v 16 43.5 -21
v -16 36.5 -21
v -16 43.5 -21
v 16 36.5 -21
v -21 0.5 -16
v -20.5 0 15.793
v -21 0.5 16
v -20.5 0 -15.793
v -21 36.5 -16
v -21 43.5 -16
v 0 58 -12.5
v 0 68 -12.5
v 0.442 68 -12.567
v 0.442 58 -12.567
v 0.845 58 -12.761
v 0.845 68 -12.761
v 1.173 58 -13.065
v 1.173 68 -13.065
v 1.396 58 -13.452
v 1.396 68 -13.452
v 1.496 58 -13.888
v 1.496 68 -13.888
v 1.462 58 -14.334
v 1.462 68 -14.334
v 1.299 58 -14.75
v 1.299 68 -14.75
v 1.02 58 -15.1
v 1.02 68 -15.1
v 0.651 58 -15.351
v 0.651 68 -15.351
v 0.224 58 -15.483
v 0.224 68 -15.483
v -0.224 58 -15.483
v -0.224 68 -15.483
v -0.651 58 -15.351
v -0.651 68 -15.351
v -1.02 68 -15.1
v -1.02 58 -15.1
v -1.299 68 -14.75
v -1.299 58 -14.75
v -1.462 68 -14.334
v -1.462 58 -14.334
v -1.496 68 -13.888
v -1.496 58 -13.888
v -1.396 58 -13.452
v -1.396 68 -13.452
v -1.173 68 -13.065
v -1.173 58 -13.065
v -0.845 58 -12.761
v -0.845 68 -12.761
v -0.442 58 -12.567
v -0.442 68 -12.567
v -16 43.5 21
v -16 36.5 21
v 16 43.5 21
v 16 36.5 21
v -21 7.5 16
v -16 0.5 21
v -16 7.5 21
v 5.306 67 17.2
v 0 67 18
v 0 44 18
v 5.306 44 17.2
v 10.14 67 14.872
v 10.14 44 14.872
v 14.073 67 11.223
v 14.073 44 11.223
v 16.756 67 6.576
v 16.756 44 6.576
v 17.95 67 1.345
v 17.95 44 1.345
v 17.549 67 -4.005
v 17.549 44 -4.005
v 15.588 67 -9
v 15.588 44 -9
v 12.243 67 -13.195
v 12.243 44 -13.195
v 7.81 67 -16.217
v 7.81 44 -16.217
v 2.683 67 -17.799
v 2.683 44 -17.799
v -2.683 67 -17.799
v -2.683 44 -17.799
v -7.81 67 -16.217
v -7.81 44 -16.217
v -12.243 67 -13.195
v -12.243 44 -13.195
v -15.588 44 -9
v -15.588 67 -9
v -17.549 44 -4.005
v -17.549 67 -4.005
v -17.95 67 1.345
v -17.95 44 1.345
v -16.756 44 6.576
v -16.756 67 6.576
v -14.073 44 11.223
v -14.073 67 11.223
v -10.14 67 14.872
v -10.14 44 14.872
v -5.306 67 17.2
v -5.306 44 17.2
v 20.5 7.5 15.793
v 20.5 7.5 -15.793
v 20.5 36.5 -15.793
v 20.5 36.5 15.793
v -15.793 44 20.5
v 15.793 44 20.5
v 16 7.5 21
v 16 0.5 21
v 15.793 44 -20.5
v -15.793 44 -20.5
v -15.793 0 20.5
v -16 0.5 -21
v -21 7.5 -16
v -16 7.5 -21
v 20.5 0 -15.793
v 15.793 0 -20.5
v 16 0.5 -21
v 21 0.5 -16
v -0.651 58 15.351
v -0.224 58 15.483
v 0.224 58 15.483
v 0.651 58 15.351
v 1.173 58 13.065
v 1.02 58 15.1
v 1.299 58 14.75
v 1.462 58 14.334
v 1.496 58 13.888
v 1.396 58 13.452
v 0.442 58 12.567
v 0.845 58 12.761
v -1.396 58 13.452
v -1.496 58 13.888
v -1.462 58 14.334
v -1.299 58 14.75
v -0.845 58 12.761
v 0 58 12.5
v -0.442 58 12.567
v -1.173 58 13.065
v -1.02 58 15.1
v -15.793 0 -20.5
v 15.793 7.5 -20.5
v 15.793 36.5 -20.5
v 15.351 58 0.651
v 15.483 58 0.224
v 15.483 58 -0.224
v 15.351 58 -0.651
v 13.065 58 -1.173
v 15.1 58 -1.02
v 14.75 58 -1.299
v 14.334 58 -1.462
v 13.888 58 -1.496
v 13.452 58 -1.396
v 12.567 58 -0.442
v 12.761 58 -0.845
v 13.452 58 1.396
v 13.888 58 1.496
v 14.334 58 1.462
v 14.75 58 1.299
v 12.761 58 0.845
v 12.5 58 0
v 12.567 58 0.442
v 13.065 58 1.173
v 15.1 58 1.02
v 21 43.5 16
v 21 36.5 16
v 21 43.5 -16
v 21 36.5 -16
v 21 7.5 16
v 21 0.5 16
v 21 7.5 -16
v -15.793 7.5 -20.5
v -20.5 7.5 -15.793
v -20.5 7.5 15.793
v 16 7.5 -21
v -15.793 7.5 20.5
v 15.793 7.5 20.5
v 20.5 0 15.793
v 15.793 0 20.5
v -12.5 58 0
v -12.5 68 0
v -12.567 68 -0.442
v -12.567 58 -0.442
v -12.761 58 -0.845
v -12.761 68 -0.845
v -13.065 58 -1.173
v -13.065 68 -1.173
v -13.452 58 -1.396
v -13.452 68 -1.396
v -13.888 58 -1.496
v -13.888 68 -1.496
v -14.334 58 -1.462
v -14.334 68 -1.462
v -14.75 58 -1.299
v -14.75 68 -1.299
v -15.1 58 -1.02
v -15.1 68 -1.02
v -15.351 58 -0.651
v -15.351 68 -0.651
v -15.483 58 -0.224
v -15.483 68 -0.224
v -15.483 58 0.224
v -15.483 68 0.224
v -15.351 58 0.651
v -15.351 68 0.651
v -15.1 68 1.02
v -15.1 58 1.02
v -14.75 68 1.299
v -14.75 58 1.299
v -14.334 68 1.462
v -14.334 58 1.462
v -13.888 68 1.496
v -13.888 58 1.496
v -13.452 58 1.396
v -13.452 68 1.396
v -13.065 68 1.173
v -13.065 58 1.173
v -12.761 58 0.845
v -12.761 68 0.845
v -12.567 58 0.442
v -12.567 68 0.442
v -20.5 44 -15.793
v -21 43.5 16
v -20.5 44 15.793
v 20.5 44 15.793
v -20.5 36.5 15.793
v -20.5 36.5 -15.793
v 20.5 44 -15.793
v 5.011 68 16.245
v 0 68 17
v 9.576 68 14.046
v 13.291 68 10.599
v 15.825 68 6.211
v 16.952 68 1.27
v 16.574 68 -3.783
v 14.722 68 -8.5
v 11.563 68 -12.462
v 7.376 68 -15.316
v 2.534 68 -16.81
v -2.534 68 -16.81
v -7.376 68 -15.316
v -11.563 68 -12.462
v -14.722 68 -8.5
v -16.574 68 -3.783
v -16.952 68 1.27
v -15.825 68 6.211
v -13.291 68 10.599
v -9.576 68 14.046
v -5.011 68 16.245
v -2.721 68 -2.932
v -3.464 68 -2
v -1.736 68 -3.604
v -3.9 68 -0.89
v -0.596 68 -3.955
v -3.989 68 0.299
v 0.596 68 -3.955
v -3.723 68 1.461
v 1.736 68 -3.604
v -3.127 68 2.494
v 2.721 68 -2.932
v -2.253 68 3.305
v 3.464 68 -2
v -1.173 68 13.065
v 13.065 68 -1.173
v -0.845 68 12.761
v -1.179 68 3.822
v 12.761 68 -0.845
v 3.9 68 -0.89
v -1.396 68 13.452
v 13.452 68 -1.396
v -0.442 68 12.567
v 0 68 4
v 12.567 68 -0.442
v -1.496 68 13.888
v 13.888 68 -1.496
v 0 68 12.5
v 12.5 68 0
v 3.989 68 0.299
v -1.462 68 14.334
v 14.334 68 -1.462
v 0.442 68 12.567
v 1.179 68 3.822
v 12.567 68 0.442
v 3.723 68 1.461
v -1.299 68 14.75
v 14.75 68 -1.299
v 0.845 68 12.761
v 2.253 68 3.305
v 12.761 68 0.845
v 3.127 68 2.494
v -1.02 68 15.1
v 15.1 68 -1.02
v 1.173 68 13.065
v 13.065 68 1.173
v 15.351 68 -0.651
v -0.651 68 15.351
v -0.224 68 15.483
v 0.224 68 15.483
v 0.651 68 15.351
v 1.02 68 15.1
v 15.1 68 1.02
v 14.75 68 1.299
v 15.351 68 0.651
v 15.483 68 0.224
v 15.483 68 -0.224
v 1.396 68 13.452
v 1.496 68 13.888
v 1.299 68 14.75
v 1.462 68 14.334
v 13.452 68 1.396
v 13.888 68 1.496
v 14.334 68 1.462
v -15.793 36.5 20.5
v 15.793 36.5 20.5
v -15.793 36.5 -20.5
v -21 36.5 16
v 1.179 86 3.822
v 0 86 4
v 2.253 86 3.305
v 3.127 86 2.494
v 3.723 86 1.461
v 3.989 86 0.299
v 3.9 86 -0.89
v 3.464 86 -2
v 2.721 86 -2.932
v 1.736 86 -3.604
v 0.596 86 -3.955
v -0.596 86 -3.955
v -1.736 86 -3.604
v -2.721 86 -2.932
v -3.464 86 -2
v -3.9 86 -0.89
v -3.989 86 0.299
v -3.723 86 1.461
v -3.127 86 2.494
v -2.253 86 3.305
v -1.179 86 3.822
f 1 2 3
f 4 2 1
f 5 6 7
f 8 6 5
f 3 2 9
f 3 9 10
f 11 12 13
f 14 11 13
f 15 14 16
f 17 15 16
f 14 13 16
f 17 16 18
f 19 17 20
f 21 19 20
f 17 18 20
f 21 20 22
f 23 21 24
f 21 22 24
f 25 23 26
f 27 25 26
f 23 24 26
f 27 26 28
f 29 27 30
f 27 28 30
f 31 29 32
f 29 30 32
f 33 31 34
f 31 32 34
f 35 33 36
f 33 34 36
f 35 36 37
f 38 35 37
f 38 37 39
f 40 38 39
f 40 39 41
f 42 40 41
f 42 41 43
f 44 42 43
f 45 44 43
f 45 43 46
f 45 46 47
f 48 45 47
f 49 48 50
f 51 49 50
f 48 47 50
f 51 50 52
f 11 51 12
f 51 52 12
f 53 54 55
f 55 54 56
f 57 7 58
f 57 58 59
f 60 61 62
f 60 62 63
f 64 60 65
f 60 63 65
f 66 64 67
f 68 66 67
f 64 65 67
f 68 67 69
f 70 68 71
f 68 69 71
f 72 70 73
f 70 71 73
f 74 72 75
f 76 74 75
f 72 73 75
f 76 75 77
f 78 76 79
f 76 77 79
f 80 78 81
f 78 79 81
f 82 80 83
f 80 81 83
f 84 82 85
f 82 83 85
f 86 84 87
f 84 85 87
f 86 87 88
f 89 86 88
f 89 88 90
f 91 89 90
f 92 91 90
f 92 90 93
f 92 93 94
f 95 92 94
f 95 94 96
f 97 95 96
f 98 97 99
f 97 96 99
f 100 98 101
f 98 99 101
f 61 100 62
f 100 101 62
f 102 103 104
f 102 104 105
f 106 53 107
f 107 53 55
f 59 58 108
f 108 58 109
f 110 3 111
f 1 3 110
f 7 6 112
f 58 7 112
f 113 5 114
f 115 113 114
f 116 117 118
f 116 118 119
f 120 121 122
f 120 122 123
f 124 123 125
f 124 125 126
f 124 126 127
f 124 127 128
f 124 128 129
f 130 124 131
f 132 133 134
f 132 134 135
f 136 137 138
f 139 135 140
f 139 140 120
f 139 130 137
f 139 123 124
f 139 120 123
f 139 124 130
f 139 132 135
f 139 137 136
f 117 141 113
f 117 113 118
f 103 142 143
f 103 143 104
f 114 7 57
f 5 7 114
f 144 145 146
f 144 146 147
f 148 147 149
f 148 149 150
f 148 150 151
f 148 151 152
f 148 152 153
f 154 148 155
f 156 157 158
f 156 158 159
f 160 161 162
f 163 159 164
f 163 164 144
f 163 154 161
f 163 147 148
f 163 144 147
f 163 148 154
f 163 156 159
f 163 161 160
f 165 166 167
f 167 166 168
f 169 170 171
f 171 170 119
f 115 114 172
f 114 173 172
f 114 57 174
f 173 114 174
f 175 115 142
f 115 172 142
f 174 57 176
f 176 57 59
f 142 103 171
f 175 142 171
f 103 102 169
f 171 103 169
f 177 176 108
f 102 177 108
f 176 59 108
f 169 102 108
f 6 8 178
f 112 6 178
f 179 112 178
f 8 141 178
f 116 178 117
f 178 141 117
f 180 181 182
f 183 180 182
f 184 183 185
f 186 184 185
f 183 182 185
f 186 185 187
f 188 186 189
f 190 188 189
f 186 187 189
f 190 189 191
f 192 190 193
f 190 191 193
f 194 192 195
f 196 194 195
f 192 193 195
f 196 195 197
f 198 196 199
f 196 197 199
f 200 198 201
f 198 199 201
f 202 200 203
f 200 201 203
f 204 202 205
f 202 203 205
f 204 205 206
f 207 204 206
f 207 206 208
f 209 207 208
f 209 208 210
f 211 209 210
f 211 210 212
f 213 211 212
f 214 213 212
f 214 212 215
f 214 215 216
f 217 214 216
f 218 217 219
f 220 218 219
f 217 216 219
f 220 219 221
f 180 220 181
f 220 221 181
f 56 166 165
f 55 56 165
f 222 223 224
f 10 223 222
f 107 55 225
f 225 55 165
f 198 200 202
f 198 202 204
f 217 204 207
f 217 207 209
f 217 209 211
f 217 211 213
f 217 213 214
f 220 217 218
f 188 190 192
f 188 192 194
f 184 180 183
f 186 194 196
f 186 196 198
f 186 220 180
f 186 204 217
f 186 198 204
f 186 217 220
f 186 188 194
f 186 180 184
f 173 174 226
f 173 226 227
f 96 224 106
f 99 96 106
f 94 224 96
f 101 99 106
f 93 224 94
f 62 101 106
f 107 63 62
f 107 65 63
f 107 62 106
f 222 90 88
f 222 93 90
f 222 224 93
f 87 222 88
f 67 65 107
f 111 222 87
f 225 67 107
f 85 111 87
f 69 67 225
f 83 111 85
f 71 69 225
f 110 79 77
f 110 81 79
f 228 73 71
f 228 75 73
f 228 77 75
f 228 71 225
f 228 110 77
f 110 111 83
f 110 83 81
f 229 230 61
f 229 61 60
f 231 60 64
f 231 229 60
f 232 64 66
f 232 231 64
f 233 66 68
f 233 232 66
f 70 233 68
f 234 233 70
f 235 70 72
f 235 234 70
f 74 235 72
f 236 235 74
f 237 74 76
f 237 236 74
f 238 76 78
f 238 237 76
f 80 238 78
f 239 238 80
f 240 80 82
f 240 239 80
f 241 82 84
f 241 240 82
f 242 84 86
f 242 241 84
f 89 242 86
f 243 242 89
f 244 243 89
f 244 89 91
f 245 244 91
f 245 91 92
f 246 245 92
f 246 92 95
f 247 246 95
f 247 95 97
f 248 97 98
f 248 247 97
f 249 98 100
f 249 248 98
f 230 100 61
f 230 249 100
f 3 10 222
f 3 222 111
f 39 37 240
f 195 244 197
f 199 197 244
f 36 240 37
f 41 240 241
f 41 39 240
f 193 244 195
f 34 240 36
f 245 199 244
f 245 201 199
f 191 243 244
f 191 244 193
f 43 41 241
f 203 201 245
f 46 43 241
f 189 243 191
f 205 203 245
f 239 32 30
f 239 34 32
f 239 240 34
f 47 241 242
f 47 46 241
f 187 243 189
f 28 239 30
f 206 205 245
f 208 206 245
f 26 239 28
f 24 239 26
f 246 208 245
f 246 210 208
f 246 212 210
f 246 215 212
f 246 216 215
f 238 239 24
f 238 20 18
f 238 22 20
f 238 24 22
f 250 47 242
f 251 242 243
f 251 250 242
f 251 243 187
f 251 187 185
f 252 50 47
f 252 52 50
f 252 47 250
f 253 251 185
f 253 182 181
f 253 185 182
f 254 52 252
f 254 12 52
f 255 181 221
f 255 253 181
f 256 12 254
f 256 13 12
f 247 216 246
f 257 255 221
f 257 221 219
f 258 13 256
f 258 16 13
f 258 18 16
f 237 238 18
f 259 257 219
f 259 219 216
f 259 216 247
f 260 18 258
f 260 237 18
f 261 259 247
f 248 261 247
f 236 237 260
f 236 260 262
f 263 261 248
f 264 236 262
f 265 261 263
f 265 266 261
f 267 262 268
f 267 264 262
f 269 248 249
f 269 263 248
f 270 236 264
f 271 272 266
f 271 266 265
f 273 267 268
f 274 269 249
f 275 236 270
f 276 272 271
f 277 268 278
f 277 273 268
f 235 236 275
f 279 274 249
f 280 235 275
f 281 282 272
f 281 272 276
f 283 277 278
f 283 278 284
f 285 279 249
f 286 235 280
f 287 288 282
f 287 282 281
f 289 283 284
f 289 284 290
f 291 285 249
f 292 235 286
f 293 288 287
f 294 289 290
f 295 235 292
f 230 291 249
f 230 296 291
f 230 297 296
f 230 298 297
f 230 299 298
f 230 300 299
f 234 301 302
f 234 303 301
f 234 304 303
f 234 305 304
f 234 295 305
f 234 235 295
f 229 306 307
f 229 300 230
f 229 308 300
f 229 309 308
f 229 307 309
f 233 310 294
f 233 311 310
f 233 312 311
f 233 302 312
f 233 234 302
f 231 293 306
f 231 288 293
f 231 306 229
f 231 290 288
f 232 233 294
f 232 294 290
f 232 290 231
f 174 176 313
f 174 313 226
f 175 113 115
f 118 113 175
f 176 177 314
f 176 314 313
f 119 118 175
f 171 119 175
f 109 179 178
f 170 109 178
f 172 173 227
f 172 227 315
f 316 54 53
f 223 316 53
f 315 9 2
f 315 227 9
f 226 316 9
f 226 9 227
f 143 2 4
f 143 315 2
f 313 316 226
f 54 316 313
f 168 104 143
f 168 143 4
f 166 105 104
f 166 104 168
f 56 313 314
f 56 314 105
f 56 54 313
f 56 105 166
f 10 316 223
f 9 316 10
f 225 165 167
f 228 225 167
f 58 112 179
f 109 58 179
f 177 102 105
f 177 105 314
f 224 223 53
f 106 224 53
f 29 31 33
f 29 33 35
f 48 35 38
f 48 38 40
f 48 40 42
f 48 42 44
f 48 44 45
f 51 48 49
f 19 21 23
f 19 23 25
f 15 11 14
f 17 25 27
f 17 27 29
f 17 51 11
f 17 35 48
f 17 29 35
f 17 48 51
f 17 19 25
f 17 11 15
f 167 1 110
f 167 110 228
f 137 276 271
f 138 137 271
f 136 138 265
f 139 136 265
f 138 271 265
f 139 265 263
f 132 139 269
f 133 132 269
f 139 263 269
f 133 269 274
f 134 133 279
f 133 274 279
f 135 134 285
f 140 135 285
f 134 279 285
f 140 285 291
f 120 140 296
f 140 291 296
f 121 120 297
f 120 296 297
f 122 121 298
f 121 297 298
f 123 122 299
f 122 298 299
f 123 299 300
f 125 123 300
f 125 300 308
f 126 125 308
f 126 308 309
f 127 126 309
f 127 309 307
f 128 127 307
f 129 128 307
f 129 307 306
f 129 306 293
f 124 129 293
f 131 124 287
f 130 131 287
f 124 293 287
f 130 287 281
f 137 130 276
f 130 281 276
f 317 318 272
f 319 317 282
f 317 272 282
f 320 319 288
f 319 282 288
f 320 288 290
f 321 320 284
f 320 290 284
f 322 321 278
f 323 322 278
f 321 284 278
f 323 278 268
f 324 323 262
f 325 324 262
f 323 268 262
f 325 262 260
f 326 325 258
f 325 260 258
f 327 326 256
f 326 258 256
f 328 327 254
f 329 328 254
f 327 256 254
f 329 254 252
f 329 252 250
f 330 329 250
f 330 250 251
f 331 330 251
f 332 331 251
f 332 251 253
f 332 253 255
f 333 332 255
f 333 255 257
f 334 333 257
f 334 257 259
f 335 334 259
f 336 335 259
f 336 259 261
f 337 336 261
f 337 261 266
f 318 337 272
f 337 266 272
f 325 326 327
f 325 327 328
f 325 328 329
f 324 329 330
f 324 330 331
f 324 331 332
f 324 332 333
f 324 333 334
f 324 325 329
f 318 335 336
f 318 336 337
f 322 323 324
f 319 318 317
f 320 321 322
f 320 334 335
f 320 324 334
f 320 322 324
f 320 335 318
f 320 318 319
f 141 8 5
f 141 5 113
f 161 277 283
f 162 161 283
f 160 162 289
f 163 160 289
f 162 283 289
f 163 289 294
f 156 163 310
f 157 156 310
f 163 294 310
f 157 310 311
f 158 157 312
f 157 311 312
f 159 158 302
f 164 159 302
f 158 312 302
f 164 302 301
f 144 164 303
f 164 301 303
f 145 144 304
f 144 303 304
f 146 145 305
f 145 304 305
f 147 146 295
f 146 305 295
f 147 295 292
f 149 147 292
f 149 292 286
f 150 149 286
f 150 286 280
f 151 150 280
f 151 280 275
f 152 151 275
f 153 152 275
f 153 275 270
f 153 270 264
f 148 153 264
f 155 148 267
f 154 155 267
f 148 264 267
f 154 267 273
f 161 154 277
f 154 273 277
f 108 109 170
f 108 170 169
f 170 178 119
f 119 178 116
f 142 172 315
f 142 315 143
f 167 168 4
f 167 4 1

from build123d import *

# Parameters (mm, degrees)
SKETCH1_W           = 42
SKETCH1_H           = 42
BOSS_EXTRUDE1_DEPTH = 44
SKETCH2_R           = 18
BOSS_EXTRUDE2_DEPTH = 24
SKETCH3_R           = 4
BOSS_EXTRUDE3_DEPTH = 18
CHAMFER1_SIZE       = 5
SKETCH4_R           = 1.5
CUT_EXTRUDE1_DEPTH  = 10
CIRPATTERN1_COUNT   = 4
CHAMFER2_SIZE       = 1
CUT_EXTRUDE2_START  = -7.5
CUT_EXTRUDE2_DEPTH  = 29
CHAMFER4_SIZE       = 0.5


with BuildPart() as part:
    # Sketch1 → Boss-Extrude1 (new body)
    with BuildSketch(Plane(origin=(0, 0, 0), x_dir=(1, 0, 0), z_dir=(0, 1, 0))):
        Rectangle(SKETCH1_W, SKETCH1_H)
    extrude(amount=BOSS_EXTRUDE1_DEPTH)

    # Sketch2 → Boss-Extrude2 (add)
    with BuildSketch(Plane(origin=(0, 44, 0), x_dir=(1, 0, 0), z_dir=(0, 1, 0))):
        with Locations(Location((0, 0, 0), (0, 0, 270))):
            Circle(SKETCH2_R)
    extrude(amount=BOSS_EXTRUDE2_DEPTH)

    # Sketch3 → Boss-Extrude3 (add)
    with BuildSketch(Plane(origin=(0, 68, 0), x_dir=(1, 0, 0), z_dir=(0, 1, 0))):
        with Locations(Location((0, 0, 0), (0, 0, 270))):
            Circle(SKETCH3_R)
    extrude(amount=BOSS_EXTRUDE3_DEPTH)

    # Chamfer1
    chamfer1_edges = [part.edges().sort_by_distance(p)[0] for p in [
        (21, 22, 21),
        (-21, 22, 21),
        (-21, 22, -21),
        (21, 22, -21),
    ]]
    chamfer(chamfer1_edges, length=CHAMFER1_SIZE)

    # Sketch4 → Cut-Extrude1 (cut)
    with BuildSketch(Plane(origin=(0, 68, 0), x_dir=(1, 0, 0), z_dir=(0, 1, 0))):
        with Locations(Location((0, 14, 0), (0, 0, 270))):
            Circle(SKETCH4_R)
    cut_extrude1 = extrude(amount=-CUT_EXTRUDE1_DEPTH, mode=Mode.SUBTRACT)

    # CirPattern1: Cut-Extrude1 ×4 about axis
    cirpattern1_axis = Axis((0, 0, 0), (0, 1, 0))
    for i in range(1, CIRPATTERN1_COUNT):
        add(cut_extrude1.rotate(cirpattern1_axis, i * 360 / CIRPATTERN1_COUNT), mode=Mode.SUBTRACT)

    # Chamfer2
    chamfer2_edges = [part.edges().sort_by_distance(p)[0] for p in [
        (0, 68, -18),
    ]]
    chamfer(chamfer2_edges, length=CHAMFER2_SIZE)

    # Sketch5 → Cut-Extrude2 (cut)
    with BuildSketch(Plane.XZ.offset(CUT_EXTRUDE2_START)):
        Polygon((-21, 16), (-21, -16), (-16, -21), (16, -21), (21, -16), (21, 16), (16, 21), (-16, 21), align=None)
        Polygon((-20.5, 15.792893219), (-20.5, -15.792893219), (-15.792893219, -20.5), (15.792893219, -20.5), (20.5, -15.792893219), (20.5, 15.792893219), (15.792893219, 20.5), (-15.792893219, 20.5), align=None, mode=Mode.SUBTRACT)
    extrude(amount=-CUT_EXTRUDE2_DEPTH, mode=Mode.SUBTRACT)

    # Chamfer4
    chamfer4_edges = [part.edges().sort_by_distance(p)[0] for p in [
        (-21, 0, 0),
        (-21, 44, 0),
        (21, 0, 0),
        (0, 0, 21),
        (0, 0, -21),
        (-18.5, 0, 18.5),
        (18.5, 0, 18.5),
        (18.5, 0, -18.5),
        (-18.5, 0, -18.5),
        (0, 44, -21),
        (21, 44, 0),
        (0, 44, 21),
        (-18.5, 44, 18.5),
        (18.5, 44, 18.5),
        (18.5, 44, -18.5),
        (-18.5, 44, -18.5),
    ]]
    chamfer(chamfer4_edges, length=CHAMFER4_SIZE)


solid = part.part
